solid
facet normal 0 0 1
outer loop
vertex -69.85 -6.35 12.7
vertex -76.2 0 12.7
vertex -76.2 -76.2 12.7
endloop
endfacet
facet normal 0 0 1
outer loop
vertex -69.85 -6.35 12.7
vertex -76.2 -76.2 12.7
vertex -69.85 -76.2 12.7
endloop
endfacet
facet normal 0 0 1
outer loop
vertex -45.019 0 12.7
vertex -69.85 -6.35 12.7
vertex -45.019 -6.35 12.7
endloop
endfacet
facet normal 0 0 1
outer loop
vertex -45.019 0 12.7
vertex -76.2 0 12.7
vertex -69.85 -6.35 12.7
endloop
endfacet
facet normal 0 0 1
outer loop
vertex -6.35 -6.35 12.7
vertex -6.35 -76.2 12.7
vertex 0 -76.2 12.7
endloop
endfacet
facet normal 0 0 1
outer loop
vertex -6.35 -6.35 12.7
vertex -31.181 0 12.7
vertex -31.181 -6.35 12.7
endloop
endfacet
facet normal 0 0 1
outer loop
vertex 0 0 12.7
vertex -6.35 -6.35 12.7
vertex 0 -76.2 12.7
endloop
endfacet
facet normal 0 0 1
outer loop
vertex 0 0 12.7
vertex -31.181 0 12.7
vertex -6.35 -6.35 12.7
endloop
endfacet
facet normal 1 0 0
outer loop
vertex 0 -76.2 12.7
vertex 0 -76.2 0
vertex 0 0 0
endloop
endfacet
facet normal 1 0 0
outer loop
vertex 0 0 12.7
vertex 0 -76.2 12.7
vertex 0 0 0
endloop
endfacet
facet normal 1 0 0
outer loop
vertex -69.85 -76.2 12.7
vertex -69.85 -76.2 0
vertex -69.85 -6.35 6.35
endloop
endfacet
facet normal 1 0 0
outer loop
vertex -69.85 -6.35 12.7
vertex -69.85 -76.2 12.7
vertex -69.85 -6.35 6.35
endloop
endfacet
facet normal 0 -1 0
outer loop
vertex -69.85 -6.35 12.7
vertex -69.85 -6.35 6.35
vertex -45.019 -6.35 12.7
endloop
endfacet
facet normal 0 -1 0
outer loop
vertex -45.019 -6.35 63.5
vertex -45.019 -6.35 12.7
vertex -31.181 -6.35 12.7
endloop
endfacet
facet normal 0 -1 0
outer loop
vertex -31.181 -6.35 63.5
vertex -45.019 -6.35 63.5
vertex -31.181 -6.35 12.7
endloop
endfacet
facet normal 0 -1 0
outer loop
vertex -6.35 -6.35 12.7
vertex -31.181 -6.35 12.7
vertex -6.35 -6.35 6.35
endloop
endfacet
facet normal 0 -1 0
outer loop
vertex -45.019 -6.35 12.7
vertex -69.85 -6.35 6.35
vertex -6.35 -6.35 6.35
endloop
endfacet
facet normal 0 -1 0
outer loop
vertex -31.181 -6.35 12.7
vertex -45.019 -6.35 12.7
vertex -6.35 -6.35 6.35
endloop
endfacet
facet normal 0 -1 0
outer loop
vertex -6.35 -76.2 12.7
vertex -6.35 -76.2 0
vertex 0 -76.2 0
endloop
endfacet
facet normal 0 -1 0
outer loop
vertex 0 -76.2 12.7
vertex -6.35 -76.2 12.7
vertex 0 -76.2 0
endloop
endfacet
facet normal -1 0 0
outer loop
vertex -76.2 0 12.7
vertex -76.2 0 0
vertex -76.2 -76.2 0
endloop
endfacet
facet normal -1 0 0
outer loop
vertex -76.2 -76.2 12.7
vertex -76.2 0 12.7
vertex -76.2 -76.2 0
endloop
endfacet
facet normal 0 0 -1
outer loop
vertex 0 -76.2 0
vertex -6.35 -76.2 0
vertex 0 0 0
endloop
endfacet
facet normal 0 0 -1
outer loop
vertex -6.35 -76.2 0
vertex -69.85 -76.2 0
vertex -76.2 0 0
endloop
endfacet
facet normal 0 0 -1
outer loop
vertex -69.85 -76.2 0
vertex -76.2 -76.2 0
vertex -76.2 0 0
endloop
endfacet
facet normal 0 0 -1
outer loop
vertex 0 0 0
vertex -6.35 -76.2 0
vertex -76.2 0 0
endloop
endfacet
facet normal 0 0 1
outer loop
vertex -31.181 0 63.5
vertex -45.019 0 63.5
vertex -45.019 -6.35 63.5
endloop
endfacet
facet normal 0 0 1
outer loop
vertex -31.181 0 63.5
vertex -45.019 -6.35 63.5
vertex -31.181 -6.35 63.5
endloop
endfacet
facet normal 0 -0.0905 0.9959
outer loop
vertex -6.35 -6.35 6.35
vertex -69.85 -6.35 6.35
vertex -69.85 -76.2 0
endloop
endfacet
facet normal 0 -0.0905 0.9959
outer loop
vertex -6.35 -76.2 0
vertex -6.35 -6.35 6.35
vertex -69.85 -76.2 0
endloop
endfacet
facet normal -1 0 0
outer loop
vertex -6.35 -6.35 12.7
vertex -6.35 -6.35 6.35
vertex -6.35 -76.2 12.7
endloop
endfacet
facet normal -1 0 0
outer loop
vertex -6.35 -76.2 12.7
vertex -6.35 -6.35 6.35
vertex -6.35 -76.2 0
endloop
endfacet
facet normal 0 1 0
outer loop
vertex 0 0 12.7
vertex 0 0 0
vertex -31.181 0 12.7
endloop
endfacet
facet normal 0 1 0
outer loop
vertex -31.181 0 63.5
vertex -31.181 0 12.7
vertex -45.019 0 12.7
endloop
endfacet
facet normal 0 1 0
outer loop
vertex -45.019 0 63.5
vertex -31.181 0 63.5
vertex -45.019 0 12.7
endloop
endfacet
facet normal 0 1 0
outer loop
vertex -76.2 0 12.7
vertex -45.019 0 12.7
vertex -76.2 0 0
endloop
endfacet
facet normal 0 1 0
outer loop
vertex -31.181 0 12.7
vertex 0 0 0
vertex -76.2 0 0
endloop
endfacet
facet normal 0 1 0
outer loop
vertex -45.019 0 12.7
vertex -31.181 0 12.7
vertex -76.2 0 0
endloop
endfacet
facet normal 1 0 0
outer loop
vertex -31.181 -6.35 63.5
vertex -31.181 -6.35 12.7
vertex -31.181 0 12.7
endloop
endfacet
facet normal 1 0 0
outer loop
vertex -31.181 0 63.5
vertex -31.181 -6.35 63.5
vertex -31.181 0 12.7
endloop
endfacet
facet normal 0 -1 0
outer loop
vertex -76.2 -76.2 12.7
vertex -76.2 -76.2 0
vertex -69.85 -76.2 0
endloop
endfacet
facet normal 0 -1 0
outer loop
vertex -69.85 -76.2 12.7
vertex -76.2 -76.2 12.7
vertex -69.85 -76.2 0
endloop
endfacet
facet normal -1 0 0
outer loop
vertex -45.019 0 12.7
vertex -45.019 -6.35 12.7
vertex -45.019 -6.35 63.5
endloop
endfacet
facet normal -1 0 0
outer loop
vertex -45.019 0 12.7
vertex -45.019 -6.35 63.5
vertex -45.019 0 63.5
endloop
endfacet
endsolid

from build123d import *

# Parameters (mm, degrees)
F1_DEPTH = 12.7
F3_DEPTH = 63.5
F4_W     = 13.838368
F4_H     = 6.35
F5_DEPTH = 50.8


with BuildPart() as f1:
    # F0 (on Top) → F1 (new body)
    with BuildSketch(Plane.XY):
        Polygon((0, -76.2), (0, 0), (-76.2, 0), (-76.2, -76.2), (-69.85, -76.2), (-69.85, -6.35), (-38.1, -6.35), (-6.35, -6.35), (-6.35, -38.1), (-6.35, -76.2), align=None)
    extrude(amount=F1_DEPTH)

    # F2 (on face) → F3 (join)
    with BuildSketch(Plane.YZ.offset(-69.85)):
        Polygon((-76.2, 0), (-6.35, 0), (-6.35, 6.35), align=None)
    extrude(amount=F3_DEPTH)

    # F4 (on face) → F5 (join)
    with BuildSketch(Plane.XY.offset(12.7)):
        with Locations((-38.1, -3.175)):
            Rectangle(F4_W, F4_H)
    extrude(amount=F5_DEPTH)


solid = f1.part
